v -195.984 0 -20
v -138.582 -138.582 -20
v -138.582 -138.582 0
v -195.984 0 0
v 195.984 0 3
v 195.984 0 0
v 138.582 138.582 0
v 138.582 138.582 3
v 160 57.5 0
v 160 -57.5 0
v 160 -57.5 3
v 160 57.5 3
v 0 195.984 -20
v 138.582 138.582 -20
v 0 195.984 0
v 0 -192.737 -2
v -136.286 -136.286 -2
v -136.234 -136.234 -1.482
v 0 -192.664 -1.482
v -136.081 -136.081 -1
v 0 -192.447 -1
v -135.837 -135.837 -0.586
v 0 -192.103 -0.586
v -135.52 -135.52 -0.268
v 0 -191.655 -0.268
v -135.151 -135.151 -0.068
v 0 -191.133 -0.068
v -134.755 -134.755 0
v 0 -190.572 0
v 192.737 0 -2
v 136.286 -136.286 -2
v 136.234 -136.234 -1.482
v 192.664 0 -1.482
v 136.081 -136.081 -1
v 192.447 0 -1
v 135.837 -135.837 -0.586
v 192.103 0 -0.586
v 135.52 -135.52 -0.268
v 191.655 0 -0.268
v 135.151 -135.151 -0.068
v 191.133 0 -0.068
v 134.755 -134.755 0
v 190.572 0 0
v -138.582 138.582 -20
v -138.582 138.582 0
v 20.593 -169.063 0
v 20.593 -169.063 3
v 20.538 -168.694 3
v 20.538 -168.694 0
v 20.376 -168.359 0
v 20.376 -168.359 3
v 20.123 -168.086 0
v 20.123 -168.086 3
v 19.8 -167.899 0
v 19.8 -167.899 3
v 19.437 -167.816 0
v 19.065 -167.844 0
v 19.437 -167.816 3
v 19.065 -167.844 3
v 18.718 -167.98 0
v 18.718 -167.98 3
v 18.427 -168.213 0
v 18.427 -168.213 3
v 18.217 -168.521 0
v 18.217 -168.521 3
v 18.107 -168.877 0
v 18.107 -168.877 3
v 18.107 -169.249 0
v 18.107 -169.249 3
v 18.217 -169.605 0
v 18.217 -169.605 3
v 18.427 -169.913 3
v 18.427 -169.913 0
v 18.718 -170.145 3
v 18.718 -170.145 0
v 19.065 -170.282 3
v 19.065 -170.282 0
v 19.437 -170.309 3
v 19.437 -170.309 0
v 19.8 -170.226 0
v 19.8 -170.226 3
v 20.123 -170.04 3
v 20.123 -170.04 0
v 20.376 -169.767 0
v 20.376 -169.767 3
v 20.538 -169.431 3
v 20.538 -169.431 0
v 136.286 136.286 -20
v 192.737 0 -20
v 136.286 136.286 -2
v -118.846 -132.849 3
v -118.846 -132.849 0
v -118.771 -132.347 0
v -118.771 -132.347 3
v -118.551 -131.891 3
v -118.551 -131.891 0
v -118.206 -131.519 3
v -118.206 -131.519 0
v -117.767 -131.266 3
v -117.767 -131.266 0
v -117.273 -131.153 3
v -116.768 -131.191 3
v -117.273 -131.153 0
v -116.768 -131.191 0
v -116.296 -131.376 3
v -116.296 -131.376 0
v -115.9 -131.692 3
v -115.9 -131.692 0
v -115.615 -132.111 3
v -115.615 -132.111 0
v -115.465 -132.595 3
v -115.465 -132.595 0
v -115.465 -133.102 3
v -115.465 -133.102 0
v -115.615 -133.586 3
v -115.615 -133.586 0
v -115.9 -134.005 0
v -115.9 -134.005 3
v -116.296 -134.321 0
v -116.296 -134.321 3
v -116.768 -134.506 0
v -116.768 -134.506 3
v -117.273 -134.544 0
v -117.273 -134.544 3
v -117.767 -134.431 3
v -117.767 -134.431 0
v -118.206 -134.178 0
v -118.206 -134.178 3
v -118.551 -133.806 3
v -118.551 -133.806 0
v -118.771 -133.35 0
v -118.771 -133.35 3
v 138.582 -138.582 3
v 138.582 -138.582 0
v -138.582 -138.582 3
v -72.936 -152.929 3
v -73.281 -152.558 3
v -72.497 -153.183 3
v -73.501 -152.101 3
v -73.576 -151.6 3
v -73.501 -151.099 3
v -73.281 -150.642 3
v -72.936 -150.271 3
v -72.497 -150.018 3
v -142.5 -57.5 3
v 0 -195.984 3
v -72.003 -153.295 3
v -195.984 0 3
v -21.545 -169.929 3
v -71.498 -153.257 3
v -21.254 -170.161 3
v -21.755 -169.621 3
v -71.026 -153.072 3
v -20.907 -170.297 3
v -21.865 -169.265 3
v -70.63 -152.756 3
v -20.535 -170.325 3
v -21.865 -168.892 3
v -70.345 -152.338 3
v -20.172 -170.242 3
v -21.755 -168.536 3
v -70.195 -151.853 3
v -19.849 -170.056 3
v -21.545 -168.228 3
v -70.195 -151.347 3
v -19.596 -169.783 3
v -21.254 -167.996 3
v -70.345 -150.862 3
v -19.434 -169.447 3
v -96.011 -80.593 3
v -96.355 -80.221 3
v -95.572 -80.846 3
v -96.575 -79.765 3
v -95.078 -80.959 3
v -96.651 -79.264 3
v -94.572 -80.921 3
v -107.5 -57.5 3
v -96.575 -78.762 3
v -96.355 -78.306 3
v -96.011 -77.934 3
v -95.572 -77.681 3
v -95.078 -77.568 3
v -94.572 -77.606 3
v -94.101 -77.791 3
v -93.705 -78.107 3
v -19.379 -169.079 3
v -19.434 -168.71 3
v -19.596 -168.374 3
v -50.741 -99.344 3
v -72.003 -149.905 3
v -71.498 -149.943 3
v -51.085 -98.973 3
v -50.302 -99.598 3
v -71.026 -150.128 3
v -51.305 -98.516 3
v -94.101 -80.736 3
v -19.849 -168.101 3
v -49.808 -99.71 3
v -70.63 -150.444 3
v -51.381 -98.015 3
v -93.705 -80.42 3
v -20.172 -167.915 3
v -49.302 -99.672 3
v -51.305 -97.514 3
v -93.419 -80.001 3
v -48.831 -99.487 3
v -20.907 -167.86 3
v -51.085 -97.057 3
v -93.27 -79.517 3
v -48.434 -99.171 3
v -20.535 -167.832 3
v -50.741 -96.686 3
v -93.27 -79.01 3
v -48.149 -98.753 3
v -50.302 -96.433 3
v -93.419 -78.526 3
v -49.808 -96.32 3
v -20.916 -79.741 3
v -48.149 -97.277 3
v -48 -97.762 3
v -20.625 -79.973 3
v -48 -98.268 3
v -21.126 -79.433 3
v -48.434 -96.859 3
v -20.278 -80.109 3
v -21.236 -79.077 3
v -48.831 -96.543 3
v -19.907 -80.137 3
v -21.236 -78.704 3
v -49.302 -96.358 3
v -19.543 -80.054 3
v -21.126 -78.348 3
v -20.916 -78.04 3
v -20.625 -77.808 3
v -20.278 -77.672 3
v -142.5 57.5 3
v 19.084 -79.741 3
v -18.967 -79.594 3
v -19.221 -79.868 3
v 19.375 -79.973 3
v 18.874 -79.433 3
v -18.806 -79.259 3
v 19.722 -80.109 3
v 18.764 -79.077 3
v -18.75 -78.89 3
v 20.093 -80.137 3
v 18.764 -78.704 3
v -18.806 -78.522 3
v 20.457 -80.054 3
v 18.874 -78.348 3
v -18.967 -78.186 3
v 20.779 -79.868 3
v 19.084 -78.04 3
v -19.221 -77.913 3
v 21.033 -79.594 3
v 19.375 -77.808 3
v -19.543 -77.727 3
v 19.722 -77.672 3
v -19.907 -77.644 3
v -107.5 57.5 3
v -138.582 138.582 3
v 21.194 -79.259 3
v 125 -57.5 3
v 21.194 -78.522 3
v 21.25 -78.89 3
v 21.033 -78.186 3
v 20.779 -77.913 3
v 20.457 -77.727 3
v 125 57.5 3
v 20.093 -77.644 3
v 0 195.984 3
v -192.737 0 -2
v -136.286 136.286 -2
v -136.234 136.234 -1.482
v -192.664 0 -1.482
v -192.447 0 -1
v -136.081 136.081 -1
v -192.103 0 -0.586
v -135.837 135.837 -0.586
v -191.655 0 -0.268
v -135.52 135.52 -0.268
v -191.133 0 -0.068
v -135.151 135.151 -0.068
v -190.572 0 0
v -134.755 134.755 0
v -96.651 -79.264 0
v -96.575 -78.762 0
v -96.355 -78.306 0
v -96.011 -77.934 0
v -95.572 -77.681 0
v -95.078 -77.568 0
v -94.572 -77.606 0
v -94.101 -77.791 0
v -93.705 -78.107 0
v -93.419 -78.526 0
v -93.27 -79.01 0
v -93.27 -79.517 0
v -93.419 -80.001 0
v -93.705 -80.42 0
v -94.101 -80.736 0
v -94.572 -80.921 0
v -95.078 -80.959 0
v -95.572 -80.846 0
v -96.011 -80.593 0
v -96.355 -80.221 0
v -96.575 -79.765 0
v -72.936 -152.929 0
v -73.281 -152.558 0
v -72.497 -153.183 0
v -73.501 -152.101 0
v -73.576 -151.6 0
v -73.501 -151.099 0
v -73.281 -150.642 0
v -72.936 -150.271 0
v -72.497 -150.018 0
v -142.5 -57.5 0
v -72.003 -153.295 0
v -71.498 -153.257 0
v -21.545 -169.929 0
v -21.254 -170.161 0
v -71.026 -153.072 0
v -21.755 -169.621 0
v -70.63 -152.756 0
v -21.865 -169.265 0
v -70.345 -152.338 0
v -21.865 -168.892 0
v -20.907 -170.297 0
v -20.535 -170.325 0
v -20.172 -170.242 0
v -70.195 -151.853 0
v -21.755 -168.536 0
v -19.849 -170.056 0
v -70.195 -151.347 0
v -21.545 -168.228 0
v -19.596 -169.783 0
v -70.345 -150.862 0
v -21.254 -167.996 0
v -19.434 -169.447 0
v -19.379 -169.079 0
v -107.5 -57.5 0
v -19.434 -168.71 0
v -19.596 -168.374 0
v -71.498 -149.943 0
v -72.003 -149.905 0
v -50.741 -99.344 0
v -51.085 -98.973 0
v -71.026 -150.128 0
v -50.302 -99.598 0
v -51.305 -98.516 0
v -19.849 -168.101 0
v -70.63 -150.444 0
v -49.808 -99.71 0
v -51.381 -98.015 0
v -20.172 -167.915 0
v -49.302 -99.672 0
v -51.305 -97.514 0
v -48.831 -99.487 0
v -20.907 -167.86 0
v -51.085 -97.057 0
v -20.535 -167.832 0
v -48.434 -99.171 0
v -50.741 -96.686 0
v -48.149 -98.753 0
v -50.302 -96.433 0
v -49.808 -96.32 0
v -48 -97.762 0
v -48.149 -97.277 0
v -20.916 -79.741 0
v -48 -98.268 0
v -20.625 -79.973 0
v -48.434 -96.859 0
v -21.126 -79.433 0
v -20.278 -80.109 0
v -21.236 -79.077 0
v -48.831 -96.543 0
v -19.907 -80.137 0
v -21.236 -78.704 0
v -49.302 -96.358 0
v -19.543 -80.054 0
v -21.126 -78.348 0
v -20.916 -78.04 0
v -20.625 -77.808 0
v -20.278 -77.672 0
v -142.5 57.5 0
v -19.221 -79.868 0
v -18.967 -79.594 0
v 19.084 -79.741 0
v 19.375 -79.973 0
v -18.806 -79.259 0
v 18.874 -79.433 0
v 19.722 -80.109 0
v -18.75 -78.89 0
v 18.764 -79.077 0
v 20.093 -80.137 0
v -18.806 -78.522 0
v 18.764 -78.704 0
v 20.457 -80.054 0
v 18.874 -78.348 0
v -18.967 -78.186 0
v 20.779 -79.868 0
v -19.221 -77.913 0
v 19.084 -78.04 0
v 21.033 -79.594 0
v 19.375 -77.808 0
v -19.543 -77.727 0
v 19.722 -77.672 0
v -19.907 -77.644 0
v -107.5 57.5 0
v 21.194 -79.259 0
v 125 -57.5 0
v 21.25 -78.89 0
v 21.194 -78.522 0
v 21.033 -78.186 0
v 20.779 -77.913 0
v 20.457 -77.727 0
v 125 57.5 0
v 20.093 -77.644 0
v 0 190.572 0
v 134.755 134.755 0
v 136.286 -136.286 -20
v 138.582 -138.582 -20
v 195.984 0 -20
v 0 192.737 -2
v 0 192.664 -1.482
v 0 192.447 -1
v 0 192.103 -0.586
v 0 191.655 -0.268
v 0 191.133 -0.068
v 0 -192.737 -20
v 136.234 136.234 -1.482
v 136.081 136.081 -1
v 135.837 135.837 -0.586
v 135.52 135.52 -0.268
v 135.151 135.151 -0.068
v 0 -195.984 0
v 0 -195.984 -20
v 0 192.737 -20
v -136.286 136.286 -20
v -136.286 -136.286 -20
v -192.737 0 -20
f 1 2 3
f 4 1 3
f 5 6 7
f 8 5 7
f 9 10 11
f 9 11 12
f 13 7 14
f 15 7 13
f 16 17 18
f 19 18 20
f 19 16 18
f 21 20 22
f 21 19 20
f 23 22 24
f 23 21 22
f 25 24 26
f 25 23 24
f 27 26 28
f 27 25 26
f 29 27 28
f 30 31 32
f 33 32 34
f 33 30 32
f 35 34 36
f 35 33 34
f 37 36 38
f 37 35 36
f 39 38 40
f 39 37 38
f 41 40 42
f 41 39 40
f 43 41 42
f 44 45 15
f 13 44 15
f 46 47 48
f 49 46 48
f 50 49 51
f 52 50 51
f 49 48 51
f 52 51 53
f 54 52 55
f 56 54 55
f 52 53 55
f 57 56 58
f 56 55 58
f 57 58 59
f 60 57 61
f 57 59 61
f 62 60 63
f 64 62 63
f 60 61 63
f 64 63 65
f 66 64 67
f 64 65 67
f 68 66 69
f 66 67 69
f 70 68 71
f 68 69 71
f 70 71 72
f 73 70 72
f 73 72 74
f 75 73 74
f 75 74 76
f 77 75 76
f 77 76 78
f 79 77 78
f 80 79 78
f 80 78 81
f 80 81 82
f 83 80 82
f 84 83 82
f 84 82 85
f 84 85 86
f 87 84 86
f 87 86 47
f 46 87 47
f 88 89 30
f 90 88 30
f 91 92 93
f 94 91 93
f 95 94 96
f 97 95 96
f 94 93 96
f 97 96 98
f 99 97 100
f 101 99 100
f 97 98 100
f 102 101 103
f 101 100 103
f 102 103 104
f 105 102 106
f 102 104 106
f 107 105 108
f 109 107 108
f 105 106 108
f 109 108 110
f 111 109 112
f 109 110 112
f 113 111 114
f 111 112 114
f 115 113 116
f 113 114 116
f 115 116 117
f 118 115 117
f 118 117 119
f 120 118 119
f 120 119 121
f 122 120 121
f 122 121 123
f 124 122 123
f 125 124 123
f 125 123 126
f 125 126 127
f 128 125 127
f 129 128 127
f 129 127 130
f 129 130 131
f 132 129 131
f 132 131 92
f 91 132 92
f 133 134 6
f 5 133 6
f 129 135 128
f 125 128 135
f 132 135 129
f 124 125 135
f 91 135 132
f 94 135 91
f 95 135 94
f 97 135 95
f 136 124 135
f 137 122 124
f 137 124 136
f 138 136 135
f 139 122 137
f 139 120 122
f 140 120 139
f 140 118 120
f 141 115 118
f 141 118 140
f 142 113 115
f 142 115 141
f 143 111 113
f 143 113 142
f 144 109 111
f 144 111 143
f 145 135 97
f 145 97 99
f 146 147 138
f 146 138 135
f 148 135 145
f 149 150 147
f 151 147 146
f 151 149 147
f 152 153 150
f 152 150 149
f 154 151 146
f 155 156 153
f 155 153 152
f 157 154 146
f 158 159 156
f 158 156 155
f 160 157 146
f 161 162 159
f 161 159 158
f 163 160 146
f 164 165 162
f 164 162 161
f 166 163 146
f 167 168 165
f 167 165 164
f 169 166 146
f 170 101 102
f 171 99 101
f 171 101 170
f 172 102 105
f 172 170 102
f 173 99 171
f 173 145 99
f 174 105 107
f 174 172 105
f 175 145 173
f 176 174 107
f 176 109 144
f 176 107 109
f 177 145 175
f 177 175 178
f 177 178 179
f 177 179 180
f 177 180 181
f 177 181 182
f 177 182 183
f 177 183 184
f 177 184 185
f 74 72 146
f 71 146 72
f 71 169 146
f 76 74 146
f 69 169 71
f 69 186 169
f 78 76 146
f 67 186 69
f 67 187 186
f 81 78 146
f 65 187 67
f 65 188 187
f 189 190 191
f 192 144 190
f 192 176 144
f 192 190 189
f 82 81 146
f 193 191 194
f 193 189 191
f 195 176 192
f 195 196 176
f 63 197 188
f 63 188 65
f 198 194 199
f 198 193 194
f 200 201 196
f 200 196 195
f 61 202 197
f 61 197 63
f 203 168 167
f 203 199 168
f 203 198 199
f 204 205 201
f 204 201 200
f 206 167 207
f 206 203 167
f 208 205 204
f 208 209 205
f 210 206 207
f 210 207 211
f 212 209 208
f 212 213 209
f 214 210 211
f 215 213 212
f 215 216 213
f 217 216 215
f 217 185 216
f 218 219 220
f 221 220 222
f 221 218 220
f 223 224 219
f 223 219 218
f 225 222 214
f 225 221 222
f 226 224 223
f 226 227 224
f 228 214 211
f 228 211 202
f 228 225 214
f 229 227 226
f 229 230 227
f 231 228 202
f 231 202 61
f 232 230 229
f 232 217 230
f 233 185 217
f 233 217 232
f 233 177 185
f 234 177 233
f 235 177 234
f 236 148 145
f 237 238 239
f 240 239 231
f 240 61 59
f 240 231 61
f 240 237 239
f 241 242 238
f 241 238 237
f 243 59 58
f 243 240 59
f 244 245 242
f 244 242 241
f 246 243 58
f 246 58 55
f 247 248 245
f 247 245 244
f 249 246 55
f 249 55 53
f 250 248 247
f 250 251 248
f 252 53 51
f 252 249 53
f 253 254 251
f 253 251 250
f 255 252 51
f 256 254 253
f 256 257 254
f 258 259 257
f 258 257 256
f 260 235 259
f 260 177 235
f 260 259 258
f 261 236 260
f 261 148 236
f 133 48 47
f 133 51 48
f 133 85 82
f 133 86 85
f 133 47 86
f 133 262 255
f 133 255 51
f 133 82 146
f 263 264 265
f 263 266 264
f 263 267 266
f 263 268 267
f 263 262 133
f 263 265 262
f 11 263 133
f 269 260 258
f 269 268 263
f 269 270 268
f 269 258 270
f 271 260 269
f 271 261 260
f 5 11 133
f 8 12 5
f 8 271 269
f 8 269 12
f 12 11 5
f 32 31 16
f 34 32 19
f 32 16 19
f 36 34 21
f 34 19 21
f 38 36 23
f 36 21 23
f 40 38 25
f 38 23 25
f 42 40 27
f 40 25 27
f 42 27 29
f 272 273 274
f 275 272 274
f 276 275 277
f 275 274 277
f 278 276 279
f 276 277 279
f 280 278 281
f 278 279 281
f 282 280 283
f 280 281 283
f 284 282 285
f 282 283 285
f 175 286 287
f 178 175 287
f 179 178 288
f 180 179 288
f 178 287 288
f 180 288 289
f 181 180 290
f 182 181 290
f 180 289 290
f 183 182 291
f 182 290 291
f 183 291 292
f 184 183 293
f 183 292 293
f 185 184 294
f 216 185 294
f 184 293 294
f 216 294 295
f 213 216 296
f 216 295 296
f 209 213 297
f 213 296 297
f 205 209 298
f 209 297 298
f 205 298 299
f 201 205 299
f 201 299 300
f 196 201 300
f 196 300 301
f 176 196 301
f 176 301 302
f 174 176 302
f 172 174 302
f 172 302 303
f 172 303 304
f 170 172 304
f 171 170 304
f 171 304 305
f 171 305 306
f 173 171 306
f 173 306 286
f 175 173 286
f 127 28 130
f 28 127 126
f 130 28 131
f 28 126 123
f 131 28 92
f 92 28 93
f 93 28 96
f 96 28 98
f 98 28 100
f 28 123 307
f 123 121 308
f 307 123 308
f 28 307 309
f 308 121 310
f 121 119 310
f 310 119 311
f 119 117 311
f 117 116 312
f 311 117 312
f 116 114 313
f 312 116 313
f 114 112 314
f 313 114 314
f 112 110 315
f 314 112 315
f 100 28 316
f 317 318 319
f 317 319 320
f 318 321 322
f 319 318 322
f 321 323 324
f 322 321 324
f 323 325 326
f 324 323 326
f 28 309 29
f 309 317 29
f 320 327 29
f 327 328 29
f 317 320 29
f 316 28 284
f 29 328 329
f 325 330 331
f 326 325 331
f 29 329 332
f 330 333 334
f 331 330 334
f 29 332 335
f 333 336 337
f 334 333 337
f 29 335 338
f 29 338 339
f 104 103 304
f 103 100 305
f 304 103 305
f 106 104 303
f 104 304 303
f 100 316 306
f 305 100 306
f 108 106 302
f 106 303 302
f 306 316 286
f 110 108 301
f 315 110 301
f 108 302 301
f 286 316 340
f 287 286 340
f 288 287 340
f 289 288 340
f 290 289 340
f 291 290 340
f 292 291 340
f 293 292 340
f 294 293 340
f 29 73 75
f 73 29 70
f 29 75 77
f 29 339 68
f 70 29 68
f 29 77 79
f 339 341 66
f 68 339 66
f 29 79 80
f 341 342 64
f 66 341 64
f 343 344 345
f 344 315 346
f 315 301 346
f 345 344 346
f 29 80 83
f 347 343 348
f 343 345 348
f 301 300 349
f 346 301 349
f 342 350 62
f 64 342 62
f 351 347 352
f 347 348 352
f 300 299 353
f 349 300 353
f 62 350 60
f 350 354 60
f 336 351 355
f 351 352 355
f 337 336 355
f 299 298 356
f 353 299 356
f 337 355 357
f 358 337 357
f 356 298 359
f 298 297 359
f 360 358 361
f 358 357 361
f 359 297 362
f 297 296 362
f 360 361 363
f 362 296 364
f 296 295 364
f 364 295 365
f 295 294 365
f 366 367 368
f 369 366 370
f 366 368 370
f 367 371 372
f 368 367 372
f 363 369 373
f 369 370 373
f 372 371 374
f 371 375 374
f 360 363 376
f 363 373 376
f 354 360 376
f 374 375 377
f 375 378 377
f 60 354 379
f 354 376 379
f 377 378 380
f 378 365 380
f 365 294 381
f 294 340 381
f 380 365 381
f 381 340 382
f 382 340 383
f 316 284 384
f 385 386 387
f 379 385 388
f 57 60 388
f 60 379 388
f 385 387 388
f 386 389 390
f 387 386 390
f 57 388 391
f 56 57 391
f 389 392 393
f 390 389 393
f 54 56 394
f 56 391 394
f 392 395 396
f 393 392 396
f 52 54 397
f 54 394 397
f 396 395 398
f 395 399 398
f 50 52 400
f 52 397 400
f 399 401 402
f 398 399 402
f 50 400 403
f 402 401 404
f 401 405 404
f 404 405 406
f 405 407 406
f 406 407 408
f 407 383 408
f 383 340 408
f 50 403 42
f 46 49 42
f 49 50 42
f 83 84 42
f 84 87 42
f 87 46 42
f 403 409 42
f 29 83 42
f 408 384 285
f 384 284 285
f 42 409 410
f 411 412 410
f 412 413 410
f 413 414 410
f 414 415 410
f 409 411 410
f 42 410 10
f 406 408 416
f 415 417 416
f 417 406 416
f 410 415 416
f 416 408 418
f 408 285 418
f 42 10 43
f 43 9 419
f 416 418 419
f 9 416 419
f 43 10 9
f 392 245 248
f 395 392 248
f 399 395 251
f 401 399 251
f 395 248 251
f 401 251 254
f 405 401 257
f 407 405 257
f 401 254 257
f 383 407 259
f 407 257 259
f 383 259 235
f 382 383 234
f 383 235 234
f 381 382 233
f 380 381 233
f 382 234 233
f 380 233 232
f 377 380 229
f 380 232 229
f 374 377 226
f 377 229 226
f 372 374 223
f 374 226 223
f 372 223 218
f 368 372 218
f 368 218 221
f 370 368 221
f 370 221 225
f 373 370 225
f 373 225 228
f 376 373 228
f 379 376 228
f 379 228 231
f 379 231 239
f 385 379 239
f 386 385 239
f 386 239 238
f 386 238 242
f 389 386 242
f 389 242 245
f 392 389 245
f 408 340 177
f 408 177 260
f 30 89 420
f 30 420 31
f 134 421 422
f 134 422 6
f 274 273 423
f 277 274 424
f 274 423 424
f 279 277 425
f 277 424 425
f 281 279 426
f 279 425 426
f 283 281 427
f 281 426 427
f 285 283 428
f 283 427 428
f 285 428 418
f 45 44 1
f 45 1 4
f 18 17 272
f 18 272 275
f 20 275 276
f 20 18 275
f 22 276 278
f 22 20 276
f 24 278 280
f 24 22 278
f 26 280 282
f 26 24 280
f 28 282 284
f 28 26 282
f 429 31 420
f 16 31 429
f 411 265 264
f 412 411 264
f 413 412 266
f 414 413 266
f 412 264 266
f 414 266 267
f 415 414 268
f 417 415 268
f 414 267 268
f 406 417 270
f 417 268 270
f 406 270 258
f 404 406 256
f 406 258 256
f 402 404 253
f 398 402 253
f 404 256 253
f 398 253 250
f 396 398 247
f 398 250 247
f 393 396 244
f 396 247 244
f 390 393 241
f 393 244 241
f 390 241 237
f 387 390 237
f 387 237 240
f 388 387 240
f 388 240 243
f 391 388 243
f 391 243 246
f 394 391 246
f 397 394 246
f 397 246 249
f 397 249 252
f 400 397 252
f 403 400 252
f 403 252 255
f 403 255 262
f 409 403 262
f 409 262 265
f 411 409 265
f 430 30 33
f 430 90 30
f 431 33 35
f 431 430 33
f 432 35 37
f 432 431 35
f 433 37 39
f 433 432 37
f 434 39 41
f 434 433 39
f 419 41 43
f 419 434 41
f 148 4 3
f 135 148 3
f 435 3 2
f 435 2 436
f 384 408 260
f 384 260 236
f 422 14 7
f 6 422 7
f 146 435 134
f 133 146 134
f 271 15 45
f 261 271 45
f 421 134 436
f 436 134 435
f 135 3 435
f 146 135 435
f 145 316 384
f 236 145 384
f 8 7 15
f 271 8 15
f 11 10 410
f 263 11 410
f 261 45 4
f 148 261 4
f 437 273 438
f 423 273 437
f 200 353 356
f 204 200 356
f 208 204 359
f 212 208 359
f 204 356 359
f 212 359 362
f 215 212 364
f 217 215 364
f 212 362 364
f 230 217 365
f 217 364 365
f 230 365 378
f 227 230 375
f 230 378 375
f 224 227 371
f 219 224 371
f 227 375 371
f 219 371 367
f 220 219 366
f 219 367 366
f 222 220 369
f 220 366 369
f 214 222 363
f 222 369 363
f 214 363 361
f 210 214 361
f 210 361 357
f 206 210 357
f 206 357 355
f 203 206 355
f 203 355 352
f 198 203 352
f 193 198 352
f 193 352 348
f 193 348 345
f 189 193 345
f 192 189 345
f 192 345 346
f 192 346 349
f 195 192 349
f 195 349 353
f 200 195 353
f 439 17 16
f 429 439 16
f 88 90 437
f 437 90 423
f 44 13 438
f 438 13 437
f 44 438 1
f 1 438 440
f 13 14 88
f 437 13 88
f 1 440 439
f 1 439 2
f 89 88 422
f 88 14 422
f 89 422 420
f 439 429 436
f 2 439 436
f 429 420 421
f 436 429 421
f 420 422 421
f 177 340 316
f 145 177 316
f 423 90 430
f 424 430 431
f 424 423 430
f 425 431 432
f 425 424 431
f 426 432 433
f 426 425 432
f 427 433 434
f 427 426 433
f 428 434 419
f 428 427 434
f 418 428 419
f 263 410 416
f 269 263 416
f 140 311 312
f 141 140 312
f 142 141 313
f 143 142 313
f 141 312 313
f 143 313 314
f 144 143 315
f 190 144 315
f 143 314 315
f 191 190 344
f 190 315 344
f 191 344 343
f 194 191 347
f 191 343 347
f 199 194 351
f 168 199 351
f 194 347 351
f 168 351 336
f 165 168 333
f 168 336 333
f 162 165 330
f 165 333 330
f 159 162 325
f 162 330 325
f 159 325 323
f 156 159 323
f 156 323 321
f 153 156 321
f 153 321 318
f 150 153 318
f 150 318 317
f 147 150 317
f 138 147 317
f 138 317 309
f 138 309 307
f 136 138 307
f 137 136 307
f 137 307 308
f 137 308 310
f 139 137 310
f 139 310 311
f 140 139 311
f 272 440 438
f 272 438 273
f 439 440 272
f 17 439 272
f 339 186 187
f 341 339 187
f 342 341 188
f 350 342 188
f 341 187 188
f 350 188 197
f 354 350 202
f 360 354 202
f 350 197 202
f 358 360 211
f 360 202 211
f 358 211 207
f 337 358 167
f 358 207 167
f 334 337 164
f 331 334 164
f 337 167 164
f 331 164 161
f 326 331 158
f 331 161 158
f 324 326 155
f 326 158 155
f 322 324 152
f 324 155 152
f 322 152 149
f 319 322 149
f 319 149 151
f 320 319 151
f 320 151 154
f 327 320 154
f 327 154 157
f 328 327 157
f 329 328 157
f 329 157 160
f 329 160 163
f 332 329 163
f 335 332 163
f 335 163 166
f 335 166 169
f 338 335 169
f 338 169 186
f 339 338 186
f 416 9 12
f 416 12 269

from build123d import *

# Parameters (mm, degrees)
BOSS_EXTRUDE1_DEPTH     = 3
SKETCH5_W               = 150
SKETCH5_H               = 20
BOSS_EXTRUDE2_DEPTH     = 3
MIRROR2_COPY_1_SKETCH_W = 150
MIRROR2_COPY_1_SKETCH_H = 20
MIRROR2_COPY_1_DEPTH    = 3
SKETCH6_W               = 23
SKETCH6_H               = 150
BOSS_EXTRUDE3_DEPTH     = 3
MIRROR4_COPY_1_SKETCH_W = 23
MIRROR4_COPY_1_SKETCH_H = 150
MIRROR4_COPY_1_DEPTH    = 3
MIRROR4_COPY_2_SKETCH_W = 23
MIRROR4_COPY_2_SKETCH_H = 150
MIRROR4_COPY_2_DEPTH    = 3
FILLET1_R               = 2
SKETCH4_W               = 35
SKETCH4_H               = 115
CUT_EXTRUDE1_DEPTH      = 10
TAP_DRILL_FOR_M3_TAP2_D = 2.5
TAP_DRILL_FOR_M3_TAP3_D = 2.5
M3_CLEARANCE_HOLE1_D    = 3.4


with BuildPart() as part:
    # Sketch1 → Boss-Extrude1 (new body)
    with BuildSketch(Plane.XY):
        Polygon((0, 195.984444731), (-138.581929877, 138.581929877), (-195.984444731, 0), (-138.581929877, -138.581929877), (0, -195.984444731), (138.581929877, -138.581929877), (195.984444731, 0), (138.581929877, 138.581929877), align=None)
    boss_extrude1 = extrude(amount=BOSS_EXTRUDE1_DEPTH)

    # Sketch5 → Boss-Extrude2 (add)
    with BuildSketch(Plane(origin=(-69.290964938, -167.283187304, 0), x_dir=(0.923879533, -0.382683432, 0), z_dir=(-0.382683432, -0.923879533, 0))):
        with Locations((0, -10)):
            Rectangle(SKETCH5_W, SKETCH5_H)
    boss_extrude2 = extrude(amount=-BOSS_EXTRUDE2_DEPTH)

    # Mirror1: Boss-Extrude2 across plane
    add(boss_extrude2.mirror(Plane.ZX))

    # Mirror2: Boss-Extrude2 across plane
    add(boss_extrude2.mirror(Plane(origin=(0, 0, 0), x_dir=(0, 0, 1), z_dir=(1, 0, 0))))

    # Mirror2 copy 1 sketch → Mirror2 copy 1 (add)
    with BuildSketch(Plane(origin=(69.290964938, 167.283187304, 0), x_dir=(-0.923879533, 0.382683432, 0), z_dir=(0.382683432, 0.923879533, 0))):
        with Locations((0, -10)):
            Rectangle(MIRROR2_COPY_1_SKETCH_W, MIRROR2_COPY_1_SKETCH_H)
    extrude(amount=-MIRROR2_COPY_1_DEPTH)

    # Sketch6 → Boss-Extrude3 (add)
    with BuildSketch(Plane(origin=(-167.283187304, -69.290964938, 0), x_dir=(0, 0, 1), z_dir=(-0.923879533, -0.382683432, 0))):
        with Locations((-8.5, 0)):
            Rectangle(SKETCH6_W, SKETCH6_H)
    boss_extrude3 = extrude(amount=-BOSS_EXTRUDE3_DEPTH)

    # Mirror3: Boss-Extrude3 across plane
    add(boss_extrude3.mirror(Plane.ZX))

    # Mirror4: Boss-Extrude1 across plane
    add(boss_extrude1.mirror(Plane(origin=(0, 0, 0), x_dir=(0, 0, 1), z_dir=(1, 0, 0))))

    # Mirror4 copy 1 sketch → Mirror4 copy 1 (add)
    with BuildSketch(Plane(origin=(167.283187304, 69.290964938, 0), x_dir=(0, 0, 1), z_dir=(0.923879533, 0.382683432, 0))):
        with Locations((-8.5, 0)):
            Rectangle(MIRROR4_COPY_1_SKETCH_W, MIRROR4_COPY_1_SKETCH_H)
    extrude(amount=-MIRROR4_COPY_1_DEPTH)

    # Mirror4 copy 2 sketch → Mirror4 copy 2 (add)
    with BuildSketch(Plane(origin=(167.283187304, -69.290964938, 0), x_dir=(0, 0, 1), z_dir=(0.923879533, -0.382683432, 0))):
        with Locations((-8.5, 0)):
            Rectangle(MIRROR4_COPY_2_SKETCH_W, MIRROR4_COPY_2_SKETCH_H)
    extrude(amount=-MIRROR4_COPY_2_DEPTH)

    # Fillet1
    fillet1_edges = [part.edges().sort_by_distance(p)[0] for p in [
        (-164.511548707, -68.142914641, 0),
        (-164.511548707, 68.142914641, 0),
        (164.511548707, 68.142914641, 0),
        (164.511548707, -68.142914641, 0),
        (-68.142914641, 164.511548707, 0),
        (68.142914641, 164.511548707, 0),
        (-68.142914641, -164.511548707, 0),
        (68.142914641, -164.511548707, 0),
    ]]
    fillet(fillet1_edges, radius=FILLET1_R)

    # Sketch4 → Cut-Extrude1 (cut)
    with BuildSketch(Plane(origin=(0, 0, 0), x_dir=(-1, 0, 0), z_dir=(0, 0, -1))):
        with Locations((-142.5, 0)):
            Rectangle(SKETCH4_W, SKETCH4_H)
        with Locations((125, 0)):
            Rectangle(SKETCH4_W, SKETCH4_H)
    extrude(amount=-CUT_EXTRUDE1_DEPTH, mode=Mode.SUBTRACT)

    # Tap Drill for M3 Tap2 (through all)
    with Locations(Plane(origin=(0, 0, 0), x_dir=(-1, 0, 0), z_dir=(0, 0, -1))):
        with Locations((-19.343368816, -169.062877249), (20.628515922, -169.078590597)):
            Hole(TAP_DRILL_FOR_M3_TAP2_D / 2)

    # Tap Drill for M3 Tap3 (through all)
    with Locations(Plane(origin=(0, 0, 0), x_dir=(-1, 0, 0), z_dir=(0, 0, -1))):
        with Locations((-20, -78.890298866), (20, -78.890298866)):
            Hole(TAP_DRILL_FOR_M3_TAP3_D / 2)

    # M3 Clearance Hole1 (through all)
    with Locations(Plane.XY.offset(3)):
        with Locations((-49.680592478, -98.01502722), (-71.876231555, -151.600040105), (-94.950689571, -79.263539034), (-117.146328648, -132.848551919)):
            Hole(M3_CLEARANCE_HOLE1_D / 2)


solid = part.part
